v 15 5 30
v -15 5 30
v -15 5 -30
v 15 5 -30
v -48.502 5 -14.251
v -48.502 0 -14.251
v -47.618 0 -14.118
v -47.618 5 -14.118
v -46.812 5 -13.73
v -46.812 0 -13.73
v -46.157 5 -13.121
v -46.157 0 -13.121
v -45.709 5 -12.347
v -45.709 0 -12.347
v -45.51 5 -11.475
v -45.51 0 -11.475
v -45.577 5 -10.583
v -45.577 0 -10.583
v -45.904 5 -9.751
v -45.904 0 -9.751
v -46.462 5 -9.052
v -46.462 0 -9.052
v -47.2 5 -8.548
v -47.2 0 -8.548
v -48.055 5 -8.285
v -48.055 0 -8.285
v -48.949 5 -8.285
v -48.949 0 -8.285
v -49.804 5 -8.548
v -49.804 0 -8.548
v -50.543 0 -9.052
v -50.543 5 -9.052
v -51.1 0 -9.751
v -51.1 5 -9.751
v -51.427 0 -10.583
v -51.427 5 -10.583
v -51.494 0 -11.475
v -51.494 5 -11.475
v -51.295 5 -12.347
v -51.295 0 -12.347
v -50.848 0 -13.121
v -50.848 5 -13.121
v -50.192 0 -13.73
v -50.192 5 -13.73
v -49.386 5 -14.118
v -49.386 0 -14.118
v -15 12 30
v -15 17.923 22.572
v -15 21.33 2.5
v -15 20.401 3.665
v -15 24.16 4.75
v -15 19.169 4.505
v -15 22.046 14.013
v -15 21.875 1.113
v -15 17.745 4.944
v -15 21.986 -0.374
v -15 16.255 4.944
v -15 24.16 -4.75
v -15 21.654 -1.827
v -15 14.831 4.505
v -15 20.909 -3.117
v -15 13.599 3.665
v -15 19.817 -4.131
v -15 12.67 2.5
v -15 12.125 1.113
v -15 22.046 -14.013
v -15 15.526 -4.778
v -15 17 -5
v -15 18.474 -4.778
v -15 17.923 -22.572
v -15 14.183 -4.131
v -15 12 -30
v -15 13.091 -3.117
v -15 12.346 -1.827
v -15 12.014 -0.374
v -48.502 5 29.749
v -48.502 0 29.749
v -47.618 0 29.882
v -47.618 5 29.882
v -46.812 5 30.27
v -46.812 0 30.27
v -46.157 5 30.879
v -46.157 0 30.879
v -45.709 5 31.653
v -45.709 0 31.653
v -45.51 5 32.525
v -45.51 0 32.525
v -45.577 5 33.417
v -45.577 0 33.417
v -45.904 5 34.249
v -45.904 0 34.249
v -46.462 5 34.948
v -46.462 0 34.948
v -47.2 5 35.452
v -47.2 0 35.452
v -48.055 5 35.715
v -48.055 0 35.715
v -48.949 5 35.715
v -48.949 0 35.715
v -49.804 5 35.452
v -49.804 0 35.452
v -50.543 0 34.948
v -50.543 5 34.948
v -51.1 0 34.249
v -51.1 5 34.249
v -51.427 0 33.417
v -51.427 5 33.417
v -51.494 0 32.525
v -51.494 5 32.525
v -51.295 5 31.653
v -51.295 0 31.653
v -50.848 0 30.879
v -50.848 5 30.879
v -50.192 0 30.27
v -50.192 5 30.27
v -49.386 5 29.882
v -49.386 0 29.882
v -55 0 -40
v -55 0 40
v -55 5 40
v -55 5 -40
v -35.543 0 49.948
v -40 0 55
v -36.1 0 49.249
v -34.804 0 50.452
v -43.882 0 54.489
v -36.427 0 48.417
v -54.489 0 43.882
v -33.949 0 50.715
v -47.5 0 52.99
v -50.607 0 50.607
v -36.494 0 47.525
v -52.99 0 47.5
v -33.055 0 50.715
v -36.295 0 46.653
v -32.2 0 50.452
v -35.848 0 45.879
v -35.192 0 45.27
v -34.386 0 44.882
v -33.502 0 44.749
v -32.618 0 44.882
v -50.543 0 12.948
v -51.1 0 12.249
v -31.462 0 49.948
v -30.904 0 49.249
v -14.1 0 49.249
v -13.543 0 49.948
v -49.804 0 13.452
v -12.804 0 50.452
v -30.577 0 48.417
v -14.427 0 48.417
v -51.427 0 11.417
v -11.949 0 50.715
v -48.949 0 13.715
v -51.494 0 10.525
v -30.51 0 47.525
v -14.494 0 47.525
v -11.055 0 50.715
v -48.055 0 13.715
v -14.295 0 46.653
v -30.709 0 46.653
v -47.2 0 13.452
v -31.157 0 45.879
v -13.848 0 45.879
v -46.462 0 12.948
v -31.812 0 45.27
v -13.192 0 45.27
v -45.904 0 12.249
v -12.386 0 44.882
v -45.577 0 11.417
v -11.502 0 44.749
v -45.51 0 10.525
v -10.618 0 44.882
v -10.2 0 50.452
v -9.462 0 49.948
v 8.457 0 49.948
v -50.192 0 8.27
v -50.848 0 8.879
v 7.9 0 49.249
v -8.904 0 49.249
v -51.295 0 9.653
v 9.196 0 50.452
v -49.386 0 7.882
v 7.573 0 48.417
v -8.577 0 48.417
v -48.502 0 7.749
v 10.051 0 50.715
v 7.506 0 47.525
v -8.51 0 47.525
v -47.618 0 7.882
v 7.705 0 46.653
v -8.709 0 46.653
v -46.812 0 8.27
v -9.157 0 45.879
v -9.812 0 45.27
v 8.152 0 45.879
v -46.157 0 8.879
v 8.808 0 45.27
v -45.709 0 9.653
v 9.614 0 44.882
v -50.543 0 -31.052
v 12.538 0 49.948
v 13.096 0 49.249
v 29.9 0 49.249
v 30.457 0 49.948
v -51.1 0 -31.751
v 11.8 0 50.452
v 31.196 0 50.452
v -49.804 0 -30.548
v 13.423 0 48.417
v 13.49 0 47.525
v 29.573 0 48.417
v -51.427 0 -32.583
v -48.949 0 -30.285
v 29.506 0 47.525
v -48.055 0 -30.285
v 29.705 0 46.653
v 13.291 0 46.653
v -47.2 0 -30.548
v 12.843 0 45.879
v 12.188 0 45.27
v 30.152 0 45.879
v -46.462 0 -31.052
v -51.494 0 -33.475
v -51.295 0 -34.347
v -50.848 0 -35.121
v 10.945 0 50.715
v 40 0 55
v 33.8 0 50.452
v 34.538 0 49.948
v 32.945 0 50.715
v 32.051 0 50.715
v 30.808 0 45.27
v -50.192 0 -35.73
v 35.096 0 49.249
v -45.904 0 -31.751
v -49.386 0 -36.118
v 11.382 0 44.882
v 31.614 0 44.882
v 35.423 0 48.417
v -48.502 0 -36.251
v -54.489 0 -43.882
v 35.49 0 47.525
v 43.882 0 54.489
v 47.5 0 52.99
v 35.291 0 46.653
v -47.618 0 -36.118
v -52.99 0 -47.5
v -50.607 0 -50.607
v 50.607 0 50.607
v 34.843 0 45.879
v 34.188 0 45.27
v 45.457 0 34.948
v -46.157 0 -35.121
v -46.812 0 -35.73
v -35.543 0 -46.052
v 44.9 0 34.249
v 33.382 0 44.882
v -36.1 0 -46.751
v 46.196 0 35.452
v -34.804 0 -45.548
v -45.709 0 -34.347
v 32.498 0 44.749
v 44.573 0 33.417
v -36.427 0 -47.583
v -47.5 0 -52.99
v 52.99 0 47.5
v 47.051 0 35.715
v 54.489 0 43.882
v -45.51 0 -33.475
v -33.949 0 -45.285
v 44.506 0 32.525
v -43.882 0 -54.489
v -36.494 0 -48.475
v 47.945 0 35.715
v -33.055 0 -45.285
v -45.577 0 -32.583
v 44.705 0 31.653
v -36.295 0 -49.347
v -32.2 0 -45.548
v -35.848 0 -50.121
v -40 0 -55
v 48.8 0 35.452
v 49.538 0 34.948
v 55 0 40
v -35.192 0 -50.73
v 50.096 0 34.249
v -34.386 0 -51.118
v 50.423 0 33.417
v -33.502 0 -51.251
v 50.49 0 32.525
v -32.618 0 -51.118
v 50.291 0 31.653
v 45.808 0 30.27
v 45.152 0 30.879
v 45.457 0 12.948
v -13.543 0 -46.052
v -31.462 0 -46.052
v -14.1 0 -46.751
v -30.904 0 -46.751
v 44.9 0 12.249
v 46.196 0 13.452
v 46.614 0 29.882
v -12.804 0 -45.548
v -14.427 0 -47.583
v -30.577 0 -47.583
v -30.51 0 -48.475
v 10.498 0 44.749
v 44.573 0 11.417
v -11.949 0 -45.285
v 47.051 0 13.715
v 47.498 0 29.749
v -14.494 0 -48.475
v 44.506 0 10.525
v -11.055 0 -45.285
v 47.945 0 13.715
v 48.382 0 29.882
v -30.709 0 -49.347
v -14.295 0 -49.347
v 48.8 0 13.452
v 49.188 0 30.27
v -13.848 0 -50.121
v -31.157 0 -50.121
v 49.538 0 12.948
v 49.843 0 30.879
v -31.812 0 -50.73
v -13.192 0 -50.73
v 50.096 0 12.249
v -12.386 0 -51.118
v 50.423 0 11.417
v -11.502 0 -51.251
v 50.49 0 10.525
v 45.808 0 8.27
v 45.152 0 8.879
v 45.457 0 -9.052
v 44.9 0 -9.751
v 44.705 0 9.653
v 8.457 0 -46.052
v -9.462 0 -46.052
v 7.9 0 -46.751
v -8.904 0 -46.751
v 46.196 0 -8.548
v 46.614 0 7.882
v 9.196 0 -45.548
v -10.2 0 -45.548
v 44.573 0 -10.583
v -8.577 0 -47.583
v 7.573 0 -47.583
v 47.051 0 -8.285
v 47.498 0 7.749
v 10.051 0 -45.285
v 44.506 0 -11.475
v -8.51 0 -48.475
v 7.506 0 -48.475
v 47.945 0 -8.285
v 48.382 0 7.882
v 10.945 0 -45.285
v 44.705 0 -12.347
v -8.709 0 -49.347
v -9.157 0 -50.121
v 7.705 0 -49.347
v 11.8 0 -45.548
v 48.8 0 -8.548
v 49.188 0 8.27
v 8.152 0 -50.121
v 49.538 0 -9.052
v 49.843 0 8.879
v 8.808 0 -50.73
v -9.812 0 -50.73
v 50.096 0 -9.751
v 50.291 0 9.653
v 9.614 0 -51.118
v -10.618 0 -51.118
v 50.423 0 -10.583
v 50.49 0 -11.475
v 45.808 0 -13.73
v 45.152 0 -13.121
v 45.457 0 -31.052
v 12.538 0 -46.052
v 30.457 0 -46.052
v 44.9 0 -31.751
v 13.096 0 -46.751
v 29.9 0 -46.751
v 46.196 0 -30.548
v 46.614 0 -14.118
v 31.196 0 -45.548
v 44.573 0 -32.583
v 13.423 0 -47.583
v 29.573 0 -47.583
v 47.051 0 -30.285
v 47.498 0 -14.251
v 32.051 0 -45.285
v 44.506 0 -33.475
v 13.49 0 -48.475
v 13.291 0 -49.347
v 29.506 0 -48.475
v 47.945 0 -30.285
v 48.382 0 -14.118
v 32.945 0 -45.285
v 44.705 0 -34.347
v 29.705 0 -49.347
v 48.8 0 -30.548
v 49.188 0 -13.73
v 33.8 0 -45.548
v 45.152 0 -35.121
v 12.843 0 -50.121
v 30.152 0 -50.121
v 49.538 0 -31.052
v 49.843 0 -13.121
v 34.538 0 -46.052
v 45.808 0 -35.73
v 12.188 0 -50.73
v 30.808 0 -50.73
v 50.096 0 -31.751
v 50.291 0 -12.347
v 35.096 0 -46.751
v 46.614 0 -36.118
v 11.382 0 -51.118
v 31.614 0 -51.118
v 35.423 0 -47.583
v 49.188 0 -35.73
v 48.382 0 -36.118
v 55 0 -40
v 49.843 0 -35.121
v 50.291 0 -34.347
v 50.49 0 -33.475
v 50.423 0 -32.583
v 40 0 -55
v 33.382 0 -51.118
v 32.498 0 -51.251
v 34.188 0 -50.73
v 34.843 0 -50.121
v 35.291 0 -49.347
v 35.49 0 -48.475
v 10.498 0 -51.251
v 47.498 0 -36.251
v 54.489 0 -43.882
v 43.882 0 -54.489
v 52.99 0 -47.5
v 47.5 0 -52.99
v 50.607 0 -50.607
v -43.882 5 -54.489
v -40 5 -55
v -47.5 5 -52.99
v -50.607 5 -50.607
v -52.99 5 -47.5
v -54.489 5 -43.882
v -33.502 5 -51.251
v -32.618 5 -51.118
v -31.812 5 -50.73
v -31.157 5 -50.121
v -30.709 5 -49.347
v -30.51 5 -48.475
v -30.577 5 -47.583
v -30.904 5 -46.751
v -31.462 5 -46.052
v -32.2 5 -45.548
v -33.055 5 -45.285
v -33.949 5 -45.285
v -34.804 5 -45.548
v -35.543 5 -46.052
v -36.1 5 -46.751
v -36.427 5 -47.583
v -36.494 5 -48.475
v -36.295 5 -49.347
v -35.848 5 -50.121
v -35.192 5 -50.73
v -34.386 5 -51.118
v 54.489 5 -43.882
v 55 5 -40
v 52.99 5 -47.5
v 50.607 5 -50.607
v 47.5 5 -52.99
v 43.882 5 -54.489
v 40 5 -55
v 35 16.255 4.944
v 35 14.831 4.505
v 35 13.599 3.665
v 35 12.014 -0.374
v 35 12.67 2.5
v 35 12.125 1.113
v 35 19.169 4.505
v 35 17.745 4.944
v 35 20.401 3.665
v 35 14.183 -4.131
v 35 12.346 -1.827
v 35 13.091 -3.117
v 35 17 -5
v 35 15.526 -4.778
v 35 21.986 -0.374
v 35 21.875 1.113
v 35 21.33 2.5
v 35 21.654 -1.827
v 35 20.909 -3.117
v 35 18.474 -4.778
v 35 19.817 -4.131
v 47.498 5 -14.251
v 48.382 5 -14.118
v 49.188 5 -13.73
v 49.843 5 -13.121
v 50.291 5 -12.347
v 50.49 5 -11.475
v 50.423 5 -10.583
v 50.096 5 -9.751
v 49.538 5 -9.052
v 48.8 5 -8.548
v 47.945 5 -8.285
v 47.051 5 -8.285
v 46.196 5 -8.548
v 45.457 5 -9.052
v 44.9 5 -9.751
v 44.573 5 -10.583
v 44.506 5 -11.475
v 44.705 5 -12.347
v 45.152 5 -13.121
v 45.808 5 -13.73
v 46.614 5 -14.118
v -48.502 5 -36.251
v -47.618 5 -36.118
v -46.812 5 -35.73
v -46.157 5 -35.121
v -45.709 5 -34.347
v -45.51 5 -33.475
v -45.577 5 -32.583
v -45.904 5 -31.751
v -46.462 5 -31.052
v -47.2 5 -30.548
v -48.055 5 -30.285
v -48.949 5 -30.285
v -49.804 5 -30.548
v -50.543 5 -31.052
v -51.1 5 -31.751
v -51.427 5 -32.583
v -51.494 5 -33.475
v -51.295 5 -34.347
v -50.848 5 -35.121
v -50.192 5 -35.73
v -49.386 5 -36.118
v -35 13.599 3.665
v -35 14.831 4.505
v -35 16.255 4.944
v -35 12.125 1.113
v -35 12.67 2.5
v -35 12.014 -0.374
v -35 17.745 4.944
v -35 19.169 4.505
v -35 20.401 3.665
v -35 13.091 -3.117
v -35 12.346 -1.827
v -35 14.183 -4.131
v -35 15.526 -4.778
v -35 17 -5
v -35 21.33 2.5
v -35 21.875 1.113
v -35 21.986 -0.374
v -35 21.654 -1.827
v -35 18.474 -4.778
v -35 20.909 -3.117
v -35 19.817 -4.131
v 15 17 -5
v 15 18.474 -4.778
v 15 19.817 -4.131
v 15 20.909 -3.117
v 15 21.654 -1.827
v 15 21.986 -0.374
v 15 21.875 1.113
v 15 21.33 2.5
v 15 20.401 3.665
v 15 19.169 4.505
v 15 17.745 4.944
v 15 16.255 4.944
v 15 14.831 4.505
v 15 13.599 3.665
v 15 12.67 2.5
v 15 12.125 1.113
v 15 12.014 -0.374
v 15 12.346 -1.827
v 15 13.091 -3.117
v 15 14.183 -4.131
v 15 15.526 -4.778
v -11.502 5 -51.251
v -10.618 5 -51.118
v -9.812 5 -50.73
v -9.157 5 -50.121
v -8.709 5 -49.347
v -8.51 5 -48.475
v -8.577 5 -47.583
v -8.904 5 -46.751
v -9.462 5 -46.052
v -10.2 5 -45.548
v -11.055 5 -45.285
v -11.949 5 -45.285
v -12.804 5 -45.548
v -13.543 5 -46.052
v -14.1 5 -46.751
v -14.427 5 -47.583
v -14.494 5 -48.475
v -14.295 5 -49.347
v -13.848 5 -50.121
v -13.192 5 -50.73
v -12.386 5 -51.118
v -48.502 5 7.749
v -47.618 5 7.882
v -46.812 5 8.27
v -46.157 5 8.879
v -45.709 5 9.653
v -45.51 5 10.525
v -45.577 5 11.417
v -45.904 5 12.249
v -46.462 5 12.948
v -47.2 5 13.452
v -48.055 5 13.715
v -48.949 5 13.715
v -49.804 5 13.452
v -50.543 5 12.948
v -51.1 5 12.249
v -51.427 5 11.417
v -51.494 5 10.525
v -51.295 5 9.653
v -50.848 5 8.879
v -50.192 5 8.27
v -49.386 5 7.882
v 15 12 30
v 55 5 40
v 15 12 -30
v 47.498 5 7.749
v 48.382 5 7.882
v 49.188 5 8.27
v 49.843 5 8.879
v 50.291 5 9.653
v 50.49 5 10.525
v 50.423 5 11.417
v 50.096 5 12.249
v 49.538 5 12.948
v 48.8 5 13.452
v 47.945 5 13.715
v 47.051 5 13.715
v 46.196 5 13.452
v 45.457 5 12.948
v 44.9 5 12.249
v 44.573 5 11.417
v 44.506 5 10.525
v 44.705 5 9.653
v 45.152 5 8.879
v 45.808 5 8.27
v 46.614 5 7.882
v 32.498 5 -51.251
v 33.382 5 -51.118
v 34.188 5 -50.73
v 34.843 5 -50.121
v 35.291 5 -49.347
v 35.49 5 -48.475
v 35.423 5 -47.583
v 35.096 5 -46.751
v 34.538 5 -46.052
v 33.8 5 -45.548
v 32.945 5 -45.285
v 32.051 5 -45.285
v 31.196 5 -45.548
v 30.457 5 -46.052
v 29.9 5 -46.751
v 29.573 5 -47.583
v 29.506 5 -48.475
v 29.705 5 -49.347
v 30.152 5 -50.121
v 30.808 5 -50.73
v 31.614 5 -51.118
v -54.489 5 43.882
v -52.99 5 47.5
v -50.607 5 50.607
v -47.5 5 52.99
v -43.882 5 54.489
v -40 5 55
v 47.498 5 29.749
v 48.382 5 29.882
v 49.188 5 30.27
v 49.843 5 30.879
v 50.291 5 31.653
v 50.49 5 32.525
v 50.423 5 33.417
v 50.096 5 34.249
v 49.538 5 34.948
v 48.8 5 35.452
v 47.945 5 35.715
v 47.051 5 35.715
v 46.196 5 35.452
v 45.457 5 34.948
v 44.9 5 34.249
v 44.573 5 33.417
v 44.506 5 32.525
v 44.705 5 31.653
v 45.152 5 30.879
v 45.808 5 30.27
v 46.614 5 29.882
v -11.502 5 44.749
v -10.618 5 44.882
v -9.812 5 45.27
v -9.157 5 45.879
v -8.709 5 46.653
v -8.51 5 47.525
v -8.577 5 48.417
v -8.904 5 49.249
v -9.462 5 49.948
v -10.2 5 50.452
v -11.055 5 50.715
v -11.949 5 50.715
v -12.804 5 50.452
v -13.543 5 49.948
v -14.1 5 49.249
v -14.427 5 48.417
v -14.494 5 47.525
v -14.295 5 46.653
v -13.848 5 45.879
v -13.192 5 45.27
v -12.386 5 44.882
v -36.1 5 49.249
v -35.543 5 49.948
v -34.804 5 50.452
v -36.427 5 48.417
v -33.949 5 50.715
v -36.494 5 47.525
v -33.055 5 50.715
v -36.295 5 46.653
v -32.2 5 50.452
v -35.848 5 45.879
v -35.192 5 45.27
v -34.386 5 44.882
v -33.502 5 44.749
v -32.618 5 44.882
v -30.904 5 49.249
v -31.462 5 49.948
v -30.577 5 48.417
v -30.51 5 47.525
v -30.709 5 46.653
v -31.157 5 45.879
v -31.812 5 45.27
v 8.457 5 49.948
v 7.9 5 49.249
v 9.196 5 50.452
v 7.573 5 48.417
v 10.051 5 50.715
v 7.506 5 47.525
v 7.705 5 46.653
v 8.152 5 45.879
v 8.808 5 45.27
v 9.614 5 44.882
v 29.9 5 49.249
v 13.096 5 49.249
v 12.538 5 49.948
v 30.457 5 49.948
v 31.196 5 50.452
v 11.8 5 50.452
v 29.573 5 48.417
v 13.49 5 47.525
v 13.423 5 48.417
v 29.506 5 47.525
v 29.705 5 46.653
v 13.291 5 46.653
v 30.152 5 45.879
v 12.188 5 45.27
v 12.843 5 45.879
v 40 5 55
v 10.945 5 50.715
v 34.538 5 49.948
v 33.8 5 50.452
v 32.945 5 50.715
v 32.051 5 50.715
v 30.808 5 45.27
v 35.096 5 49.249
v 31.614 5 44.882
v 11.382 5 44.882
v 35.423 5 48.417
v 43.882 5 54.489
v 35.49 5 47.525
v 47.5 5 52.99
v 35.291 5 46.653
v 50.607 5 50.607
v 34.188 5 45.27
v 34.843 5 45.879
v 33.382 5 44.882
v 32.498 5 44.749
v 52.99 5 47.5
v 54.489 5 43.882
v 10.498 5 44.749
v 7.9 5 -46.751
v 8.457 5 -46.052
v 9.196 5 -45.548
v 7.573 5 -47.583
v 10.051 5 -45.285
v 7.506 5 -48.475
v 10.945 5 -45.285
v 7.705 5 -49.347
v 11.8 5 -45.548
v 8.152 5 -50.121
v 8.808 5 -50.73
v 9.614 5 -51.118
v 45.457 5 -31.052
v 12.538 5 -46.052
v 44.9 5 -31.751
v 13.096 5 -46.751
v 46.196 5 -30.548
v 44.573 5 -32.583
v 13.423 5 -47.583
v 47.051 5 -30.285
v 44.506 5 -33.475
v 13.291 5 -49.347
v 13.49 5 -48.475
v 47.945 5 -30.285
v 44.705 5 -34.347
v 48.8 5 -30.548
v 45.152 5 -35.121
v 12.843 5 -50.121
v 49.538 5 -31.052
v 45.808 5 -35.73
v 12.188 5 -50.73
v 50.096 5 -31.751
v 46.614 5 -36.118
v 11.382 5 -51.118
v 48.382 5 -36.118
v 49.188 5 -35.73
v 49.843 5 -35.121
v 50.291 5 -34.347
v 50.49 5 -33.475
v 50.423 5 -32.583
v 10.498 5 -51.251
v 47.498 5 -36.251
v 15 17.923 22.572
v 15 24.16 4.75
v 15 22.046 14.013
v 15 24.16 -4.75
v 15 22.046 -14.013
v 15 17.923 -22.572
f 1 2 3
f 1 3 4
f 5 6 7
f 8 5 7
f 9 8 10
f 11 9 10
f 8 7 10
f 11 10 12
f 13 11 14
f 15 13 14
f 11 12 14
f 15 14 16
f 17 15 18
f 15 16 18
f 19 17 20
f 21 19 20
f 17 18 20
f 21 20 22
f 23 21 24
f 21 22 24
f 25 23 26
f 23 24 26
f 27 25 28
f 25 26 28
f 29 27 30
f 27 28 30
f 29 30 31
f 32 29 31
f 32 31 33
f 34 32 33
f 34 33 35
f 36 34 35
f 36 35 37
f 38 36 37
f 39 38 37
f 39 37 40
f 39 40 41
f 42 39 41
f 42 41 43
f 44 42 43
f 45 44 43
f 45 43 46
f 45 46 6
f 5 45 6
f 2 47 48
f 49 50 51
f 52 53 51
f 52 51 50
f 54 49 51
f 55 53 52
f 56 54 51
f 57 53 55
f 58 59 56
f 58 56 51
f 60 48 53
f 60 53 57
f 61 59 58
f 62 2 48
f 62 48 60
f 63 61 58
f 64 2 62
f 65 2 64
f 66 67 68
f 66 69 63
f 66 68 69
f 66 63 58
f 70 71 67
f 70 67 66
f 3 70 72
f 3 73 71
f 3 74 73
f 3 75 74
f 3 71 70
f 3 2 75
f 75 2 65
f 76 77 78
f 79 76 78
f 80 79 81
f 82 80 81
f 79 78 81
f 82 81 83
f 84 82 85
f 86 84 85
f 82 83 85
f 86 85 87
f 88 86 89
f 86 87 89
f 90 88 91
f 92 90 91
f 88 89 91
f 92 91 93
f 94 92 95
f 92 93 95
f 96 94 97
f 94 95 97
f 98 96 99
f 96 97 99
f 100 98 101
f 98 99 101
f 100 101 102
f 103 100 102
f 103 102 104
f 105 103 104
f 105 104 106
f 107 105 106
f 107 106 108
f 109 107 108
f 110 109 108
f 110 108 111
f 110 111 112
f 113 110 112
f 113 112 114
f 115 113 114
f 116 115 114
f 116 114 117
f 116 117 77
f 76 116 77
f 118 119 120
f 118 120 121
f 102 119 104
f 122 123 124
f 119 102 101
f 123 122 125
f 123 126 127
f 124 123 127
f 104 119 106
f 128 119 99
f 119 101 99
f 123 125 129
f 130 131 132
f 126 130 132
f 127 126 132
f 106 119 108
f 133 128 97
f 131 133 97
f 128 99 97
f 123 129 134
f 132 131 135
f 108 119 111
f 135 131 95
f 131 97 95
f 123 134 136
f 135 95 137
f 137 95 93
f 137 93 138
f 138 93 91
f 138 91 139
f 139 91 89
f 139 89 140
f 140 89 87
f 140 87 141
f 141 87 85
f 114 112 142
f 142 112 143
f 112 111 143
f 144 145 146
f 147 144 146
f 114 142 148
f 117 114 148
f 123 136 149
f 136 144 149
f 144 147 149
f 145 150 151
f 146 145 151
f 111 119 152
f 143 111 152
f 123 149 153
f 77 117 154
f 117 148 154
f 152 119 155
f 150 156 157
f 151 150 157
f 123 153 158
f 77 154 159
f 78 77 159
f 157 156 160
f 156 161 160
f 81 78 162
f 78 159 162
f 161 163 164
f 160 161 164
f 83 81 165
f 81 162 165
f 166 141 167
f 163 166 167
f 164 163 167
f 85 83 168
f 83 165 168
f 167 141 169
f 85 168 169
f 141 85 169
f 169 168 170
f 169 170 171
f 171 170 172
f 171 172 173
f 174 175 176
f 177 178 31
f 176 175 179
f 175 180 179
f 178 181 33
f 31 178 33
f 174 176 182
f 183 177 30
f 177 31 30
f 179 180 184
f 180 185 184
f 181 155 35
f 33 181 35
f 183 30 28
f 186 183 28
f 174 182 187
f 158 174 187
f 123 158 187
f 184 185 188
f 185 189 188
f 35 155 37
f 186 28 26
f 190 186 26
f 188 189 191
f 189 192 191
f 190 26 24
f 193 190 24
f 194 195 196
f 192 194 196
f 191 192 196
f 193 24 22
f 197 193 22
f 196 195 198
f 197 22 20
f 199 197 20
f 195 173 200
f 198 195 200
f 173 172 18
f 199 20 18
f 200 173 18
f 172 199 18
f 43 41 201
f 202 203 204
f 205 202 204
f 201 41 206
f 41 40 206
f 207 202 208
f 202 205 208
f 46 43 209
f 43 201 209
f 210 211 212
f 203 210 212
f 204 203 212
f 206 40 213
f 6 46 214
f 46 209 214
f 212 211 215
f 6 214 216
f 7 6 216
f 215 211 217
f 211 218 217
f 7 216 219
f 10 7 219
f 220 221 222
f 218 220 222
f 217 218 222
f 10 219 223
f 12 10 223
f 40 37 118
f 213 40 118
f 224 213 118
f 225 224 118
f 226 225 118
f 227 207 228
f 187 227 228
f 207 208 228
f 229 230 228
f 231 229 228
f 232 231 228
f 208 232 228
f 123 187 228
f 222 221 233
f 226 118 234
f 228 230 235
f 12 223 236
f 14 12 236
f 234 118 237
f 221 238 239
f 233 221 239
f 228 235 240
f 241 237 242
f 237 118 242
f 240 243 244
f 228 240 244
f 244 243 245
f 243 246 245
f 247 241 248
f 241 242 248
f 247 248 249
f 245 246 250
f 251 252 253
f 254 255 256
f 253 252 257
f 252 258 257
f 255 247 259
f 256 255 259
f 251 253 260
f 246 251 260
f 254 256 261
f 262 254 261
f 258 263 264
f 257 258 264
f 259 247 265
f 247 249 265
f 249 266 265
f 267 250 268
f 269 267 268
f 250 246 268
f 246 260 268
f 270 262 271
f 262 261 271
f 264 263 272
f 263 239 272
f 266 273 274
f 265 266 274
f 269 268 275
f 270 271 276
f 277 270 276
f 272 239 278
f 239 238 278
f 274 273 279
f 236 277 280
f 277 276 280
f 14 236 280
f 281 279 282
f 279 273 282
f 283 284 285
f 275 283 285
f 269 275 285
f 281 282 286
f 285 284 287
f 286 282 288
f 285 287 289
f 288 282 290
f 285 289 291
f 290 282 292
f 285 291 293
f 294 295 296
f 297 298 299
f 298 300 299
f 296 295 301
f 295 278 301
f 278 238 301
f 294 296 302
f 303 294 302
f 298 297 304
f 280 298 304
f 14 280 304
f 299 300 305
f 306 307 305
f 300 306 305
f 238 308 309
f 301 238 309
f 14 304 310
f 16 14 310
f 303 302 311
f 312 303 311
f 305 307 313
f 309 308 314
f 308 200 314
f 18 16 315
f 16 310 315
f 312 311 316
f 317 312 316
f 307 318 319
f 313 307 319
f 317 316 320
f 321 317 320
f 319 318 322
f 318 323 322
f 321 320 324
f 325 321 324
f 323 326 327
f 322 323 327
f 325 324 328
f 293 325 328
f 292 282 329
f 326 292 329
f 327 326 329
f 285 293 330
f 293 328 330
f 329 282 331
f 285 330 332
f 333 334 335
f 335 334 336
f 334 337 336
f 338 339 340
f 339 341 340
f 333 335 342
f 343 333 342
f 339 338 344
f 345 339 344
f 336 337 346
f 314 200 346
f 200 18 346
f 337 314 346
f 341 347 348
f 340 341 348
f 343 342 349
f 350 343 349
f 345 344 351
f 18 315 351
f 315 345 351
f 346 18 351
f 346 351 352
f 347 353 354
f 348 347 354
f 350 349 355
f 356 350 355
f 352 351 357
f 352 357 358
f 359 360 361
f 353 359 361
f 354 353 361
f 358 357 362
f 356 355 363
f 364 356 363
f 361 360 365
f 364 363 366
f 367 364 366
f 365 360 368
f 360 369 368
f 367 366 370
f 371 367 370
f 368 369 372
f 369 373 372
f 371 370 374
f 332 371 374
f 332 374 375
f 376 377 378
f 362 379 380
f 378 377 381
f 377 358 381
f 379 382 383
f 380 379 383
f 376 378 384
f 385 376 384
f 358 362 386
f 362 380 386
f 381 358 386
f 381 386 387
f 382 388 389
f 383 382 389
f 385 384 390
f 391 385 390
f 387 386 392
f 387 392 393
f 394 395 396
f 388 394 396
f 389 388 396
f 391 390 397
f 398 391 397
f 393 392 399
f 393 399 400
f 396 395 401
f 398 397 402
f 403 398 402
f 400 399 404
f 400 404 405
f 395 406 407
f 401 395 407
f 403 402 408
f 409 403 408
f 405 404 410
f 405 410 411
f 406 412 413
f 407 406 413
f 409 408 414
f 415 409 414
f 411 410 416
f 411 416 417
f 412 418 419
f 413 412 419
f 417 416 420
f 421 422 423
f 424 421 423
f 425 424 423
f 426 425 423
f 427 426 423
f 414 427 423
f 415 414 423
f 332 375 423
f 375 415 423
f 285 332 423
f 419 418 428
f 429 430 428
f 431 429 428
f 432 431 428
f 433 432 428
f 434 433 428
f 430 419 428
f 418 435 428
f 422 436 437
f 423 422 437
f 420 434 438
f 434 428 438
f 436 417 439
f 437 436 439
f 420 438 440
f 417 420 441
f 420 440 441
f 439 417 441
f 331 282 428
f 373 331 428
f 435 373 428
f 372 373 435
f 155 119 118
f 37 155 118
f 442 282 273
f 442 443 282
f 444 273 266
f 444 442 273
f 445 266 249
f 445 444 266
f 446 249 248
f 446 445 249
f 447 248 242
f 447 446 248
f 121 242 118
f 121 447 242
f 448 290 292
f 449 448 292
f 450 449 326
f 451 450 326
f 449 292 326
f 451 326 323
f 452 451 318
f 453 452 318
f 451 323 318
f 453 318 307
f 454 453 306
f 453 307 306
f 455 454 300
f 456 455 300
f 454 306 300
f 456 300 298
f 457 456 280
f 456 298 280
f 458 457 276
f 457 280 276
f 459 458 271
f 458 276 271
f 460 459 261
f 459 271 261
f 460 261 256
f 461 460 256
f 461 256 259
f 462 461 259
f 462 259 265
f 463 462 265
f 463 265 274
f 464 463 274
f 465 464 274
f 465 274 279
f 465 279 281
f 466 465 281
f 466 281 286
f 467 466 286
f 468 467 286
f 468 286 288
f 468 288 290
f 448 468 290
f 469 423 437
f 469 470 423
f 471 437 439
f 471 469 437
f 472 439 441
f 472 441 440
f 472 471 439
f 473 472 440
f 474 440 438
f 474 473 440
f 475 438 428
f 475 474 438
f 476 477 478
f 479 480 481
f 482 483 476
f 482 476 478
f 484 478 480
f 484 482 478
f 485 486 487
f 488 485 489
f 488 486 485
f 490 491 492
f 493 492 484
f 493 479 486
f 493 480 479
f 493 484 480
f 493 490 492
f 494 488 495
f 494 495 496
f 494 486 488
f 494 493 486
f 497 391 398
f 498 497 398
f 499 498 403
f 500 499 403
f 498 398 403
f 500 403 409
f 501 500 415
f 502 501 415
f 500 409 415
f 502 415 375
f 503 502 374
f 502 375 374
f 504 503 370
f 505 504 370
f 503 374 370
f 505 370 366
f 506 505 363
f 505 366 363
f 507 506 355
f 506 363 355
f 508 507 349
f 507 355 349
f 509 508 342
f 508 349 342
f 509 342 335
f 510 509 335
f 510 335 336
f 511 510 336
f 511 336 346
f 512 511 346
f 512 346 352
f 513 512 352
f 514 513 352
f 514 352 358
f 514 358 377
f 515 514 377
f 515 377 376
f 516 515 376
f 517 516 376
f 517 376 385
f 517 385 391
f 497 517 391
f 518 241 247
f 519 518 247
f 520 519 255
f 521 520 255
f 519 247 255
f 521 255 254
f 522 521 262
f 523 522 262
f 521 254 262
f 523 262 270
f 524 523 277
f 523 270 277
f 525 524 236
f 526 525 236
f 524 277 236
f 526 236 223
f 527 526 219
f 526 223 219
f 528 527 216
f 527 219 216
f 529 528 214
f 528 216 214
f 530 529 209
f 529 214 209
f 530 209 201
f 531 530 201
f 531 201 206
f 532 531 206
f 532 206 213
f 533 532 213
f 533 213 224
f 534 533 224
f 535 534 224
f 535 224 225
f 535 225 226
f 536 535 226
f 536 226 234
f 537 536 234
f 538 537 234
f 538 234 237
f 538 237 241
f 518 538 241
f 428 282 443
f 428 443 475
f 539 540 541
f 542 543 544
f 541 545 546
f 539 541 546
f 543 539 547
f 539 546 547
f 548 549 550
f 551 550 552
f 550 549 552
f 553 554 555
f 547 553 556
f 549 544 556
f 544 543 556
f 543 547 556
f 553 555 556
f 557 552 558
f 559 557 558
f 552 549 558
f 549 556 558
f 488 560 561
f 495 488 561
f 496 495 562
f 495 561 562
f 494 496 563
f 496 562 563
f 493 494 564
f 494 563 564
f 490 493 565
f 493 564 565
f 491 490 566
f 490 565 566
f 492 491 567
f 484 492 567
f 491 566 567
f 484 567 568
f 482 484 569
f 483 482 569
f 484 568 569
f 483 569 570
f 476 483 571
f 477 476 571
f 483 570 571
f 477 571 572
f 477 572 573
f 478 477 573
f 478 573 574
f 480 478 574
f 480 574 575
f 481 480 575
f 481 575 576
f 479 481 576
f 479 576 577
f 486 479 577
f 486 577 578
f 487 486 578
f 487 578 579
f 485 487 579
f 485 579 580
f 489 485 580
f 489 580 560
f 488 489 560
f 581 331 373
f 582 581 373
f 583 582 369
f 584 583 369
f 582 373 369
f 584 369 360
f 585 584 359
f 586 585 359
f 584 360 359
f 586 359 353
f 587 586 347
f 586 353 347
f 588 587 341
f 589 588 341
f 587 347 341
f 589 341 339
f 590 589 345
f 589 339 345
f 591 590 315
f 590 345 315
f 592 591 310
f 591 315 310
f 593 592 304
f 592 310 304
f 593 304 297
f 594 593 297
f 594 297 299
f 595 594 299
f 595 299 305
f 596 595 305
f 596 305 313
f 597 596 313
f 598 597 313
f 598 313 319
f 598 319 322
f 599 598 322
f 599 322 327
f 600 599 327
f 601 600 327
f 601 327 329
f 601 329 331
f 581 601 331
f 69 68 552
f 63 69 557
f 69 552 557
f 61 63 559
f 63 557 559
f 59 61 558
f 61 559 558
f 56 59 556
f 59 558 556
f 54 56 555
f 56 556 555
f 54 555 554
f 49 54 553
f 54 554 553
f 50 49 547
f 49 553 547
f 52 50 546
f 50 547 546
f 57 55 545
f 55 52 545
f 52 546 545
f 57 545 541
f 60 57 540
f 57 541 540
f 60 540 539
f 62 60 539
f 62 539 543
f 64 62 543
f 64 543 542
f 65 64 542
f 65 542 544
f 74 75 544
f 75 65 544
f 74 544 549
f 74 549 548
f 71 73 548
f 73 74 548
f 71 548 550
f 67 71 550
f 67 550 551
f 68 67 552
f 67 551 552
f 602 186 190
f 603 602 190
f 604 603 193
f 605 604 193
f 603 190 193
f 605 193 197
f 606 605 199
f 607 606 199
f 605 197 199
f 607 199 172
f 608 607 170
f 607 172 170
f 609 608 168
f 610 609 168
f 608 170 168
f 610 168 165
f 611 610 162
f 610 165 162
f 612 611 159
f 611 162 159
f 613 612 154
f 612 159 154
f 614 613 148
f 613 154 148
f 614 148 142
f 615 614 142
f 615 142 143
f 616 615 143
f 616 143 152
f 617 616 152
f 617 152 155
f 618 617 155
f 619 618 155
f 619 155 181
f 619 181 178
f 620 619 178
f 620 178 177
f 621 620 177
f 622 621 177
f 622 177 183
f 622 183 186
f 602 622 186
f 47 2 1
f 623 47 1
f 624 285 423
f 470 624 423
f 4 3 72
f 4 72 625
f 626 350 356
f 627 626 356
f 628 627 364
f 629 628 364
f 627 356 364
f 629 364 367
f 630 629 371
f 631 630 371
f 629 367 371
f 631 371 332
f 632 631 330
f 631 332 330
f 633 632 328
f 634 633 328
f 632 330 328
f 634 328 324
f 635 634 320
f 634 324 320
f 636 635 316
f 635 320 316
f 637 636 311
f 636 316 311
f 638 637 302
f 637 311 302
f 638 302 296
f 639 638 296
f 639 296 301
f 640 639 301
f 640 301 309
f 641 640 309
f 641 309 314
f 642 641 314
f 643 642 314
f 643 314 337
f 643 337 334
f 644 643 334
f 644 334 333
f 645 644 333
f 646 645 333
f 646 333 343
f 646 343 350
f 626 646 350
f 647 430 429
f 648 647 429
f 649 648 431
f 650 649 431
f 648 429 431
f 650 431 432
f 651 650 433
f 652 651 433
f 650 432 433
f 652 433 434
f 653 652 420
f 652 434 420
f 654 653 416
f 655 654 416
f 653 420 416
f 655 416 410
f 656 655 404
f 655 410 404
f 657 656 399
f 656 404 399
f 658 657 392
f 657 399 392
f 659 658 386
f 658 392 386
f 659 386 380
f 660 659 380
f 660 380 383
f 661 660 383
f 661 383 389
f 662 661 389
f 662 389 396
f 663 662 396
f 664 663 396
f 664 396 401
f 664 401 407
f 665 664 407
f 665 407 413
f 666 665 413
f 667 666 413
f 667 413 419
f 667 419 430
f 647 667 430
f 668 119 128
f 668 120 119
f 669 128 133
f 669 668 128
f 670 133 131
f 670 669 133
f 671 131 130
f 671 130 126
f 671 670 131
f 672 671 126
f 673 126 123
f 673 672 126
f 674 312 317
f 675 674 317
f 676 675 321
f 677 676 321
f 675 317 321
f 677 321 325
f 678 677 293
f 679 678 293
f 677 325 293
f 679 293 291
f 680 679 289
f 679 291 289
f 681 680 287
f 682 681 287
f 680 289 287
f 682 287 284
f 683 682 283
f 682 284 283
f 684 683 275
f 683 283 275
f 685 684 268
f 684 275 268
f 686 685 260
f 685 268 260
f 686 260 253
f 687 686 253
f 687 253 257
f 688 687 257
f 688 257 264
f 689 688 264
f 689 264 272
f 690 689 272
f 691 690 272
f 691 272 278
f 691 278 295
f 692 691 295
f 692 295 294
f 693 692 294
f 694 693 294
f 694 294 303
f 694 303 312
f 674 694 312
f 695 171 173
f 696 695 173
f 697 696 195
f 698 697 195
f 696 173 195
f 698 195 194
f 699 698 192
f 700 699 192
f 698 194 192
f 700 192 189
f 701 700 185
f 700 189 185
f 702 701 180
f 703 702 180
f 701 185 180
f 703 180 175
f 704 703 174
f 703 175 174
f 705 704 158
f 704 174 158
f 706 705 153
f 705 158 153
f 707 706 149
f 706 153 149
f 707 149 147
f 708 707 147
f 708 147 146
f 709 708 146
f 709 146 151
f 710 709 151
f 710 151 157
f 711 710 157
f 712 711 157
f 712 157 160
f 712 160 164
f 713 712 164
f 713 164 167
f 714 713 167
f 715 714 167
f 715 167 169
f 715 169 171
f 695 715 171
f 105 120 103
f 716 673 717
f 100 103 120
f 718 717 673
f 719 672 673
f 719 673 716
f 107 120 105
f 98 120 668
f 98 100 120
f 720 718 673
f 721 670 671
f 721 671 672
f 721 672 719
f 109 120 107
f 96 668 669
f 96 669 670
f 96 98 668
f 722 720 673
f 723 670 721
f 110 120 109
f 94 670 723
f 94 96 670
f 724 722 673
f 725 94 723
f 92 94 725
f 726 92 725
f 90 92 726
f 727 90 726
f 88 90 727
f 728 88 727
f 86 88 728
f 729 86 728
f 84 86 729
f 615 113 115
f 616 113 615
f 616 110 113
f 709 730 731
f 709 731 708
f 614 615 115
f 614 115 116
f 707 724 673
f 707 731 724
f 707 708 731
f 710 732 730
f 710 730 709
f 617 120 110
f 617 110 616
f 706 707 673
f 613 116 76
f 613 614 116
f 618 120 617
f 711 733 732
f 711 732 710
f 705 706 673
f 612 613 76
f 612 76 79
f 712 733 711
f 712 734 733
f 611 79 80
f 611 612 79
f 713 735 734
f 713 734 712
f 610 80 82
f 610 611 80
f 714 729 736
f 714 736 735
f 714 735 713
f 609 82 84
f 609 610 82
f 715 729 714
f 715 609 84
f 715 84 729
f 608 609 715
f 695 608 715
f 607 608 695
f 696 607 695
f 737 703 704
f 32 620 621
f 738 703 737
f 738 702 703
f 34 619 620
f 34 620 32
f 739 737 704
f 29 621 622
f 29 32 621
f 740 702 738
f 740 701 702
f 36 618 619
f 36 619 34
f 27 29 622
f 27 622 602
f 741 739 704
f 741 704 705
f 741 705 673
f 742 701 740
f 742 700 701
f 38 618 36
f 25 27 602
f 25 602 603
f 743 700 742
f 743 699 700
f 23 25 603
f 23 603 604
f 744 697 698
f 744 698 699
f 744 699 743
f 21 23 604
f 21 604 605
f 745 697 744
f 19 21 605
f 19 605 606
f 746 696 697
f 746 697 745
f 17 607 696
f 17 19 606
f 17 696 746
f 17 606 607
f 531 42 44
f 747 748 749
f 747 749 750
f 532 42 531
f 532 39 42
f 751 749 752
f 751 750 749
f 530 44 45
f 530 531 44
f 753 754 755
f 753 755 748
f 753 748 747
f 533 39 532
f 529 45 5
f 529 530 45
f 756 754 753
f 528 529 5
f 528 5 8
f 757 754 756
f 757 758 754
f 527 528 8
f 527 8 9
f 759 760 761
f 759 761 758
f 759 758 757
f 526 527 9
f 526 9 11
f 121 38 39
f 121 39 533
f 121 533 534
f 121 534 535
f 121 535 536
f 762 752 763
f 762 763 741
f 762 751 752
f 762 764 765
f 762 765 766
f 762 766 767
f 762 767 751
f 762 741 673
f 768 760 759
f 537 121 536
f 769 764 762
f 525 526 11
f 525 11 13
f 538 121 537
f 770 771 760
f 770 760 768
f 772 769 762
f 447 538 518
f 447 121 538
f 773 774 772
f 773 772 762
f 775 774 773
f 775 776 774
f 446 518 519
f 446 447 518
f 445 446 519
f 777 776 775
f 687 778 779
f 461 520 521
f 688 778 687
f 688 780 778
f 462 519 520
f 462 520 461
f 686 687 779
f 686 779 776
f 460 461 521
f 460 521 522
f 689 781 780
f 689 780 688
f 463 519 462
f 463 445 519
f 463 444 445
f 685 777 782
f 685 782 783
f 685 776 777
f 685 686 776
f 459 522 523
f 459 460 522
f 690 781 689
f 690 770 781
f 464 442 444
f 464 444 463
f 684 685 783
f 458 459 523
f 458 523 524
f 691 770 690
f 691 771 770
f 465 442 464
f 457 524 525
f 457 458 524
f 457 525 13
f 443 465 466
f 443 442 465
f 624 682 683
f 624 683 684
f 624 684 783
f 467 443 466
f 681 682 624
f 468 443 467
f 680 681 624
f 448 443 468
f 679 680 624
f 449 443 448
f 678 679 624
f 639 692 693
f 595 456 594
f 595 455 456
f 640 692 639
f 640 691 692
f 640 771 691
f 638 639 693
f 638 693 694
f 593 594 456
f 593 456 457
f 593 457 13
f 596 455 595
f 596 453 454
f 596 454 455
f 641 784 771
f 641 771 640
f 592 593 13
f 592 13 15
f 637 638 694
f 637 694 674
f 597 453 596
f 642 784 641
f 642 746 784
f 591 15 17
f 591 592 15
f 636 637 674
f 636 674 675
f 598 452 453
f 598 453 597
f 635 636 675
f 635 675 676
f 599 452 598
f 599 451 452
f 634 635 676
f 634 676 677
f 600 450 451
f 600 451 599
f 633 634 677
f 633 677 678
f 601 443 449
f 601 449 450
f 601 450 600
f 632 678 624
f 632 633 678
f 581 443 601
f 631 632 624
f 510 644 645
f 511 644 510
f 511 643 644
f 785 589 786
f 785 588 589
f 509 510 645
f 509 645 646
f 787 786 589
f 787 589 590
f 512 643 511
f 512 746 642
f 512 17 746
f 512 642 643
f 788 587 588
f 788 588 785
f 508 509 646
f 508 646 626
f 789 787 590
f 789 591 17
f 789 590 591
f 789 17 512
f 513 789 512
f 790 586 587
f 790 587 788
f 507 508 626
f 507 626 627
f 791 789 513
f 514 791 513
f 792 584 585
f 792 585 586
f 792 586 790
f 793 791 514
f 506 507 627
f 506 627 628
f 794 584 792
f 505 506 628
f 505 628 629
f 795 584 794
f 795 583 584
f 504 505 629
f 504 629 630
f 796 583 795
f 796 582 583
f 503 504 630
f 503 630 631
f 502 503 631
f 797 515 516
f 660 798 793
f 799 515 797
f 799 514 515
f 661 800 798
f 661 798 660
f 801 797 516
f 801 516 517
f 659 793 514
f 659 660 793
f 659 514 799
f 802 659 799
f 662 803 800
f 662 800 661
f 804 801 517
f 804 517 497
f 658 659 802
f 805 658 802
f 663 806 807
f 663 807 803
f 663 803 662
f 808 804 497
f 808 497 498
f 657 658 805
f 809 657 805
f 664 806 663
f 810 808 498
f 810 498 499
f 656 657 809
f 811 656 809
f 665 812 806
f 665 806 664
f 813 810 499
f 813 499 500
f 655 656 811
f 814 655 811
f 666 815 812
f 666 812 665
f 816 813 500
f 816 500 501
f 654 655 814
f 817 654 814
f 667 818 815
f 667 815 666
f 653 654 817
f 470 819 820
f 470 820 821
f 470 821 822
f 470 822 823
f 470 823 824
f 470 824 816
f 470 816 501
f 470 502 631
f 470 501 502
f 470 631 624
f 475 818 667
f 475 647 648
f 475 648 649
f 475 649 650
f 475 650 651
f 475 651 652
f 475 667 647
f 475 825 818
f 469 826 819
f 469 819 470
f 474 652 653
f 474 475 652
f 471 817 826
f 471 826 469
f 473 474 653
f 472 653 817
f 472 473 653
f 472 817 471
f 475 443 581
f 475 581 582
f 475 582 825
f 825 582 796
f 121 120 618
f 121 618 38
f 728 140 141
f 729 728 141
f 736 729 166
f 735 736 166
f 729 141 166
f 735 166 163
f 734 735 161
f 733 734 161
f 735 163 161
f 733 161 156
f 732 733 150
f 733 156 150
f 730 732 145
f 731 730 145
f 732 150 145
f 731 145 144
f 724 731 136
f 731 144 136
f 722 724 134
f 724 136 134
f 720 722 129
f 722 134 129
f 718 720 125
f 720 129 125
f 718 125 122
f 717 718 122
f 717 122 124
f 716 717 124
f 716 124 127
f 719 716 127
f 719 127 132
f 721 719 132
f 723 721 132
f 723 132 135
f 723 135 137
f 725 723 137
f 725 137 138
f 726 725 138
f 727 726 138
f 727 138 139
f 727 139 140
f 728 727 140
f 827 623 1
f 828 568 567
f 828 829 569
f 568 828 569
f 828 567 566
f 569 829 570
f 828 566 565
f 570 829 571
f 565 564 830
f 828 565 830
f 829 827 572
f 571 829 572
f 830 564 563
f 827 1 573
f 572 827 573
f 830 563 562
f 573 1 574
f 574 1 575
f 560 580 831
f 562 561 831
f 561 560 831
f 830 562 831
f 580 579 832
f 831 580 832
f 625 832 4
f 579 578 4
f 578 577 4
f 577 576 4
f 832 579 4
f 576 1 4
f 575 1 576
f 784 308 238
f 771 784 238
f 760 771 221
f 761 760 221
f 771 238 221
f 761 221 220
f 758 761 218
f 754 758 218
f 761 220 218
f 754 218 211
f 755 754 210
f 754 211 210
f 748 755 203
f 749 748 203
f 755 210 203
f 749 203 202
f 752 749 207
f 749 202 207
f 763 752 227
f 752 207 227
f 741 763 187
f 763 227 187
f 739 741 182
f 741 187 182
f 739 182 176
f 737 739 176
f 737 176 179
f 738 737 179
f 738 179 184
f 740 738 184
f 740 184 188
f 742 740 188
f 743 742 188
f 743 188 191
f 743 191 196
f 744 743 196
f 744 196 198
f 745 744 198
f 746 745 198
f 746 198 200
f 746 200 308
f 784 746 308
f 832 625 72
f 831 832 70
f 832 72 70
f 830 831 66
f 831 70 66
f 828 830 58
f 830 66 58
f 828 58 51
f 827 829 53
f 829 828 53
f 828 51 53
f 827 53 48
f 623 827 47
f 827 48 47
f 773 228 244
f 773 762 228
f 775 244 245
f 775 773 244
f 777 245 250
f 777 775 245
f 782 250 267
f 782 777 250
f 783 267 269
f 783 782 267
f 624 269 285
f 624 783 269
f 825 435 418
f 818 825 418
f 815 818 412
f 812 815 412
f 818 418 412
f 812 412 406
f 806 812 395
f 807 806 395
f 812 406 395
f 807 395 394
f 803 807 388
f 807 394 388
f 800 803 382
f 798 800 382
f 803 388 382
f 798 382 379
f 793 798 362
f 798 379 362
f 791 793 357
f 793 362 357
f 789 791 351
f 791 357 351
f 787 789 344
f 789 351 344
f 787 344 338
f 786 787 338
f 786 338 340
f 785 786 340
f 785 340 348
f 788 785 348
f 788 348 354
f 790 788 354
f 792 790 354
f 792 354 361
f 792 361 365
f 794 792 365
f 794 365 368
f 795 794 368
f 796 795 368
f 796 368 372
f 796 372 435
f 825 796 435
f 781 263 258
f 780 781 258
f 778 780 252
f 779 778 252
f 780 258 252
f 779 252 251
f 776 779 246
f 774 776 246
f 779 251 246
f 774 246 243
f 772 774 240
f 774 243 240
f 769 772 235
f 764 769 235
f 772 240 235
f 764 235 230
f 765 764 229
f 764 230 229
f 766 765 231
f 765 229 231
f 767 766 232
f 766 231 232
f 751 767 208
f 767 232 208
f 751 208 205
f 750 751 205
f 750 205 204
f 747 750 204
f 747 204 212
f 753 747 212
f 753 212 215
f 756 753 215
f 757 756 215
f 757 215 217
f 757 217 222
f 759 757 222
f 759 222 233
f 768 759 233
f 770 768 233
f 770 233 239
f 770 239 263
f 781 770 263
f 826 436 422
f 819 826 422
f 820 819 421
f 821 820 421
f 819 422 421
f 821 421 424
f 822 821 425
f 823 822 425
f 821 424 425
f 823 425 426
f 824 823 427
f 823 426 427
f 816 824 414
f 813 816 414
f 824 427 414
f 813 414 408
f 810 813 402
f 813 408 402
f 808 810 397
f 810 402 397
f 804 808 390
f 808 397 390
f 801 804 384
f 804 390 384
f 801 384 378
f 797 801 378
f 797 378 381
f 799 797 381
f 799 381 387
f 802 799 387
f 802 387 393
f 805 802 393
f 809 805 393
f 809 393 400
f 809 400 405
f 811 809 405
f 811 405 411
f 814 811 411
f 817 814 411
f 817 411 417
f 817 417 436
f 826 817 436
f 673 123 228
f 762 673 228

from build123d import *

# Parameters (mm, degrees)
SKETCH1_W                = 110
SKETCH1_H                = 110
BOSS_EXTRUDE1_DEPTH      = 5
FILLET2_R                = 15
FILLET3_R                = 15
FILLET4_R                = 15
FILLET5_R                = 15
SKETCH2_W                = 30
SKETCH2_H                = 60
BOSS_EXTRUDE2_DEPTH      = 24
BOSS_EXTRUDE3_DEPTH      = 20
BOSS_EXTRUDE3_DEPTH_BACK = 50
SKETCH4_R                = 5
FILLET6_R                = 10
FILLET7_R                = 10
SKETCH5_R                = 3
CUT_EXTRUDE2_DEPTH       = 10
CUT_EXTRUDE3_DEPTH       = 60


with BuildPart() as part:
    # Sketch1 → Boss-Extrude1 (new body)
    with BuildSketch(Plane(origin=(0, 0, 0), x_dir=(1, 0, 0), z_dir=(0, 1, 0))):
        Rectangle(SKETCH1_W, SKETCH1_H)
    extrude(amount=BOSS_EXTRUDE1_DEPTH)

    # Fillet2
    fillet2_edges = [part.edges().sort_by_distance(p)[0] for p in [
        (55, 2.5, -55),
    ]]
    fillet(fillet2_edges, radius=FILLET2_R)

    # Fillet3
    fillet3_edges = [part.edges().sort_by_distance(p)[0] for p in [
        (-55, 2.5, -55),
    ]]
    fillet(fillet3_edges, radius=FILLET3_R)

    # Fillet4
    fillet4_edges = [part.edges().sort_by_distance(p)[0] for p in [
        (-55, 2.5, 55),
    ]]
    fillet(fillet4_edges, radius=FILLET4_R)

    # Fillet5
    fillet5_edges = [part.edges().sort_by_distance(p)[0] for p in [
        (55, 2.5, 55),
    ]]
    fillet(fillet5_edges, radius=FILLET5_R)

    # Sketch2 → Boss-Extrude2 (add)
    with BuildSketch(Plane(origin=(0, 5, 0), x_dir=(1, 0, 0), z_dir=(0, 1, 0))):
        Rectangle(SKETCH2_W, SKETCH2_H)
    extrude(amount=BOSS_EXTRUDE2_DEPTH)

    # Sketch4 → Boss-Extrude3 (add, two sides: drawn at the far end of the back side and taken through both)
    with BuildSketch(Plane(origin=(15, 0, 0), x_dir=(0, 0, -1), z_dir=(1, 0, 0)).offset(-BOSS_EXTRUDE3_DEPTH_BACK)):
        with Locations((0, 17)):
            Circle(SKETCH4_R)
    extrude(amount=BOSS_EXTRUDE3_DEPTH + BOSS_EXTRUDE3_DEPTH_BACK)

    # Fillet6
    fillet6_edges = [part.edges().sort_by_distance(p)[0] for p in [
        (0, 29, 30),
    ]]
    fillet(fillet6_edges, radius=FILLET6_R)

    # Fillet7
    fillet7_edges = [part.edges().sort_by_distance(p)[0] for p in [
        (0, 29, -30),
    ]]
    fillet(fillet7_edges, radius=FILLET7_R)

    # Sketch5 → Cut-Extrude2 (cut)
    with BuildSketch(Plane.XZ):
        with Locations((47.497955542, -11.251022229)):
            Circle(SKETCH5_R)
        with Locations((47.497955542, 32.748977771)):
            Circle(SKETCH5_R)
        with Locations((-48.502044458, 10.748977771)):
            Circle(SKETCH5_R)
        with Locations((-48.502044458, -11.251022229)):
            Circle(SKETCH5_R)
        with Locations((-48.502044458, -33.251022229)):
            Circle(SKETCH5_R)
        with Locations((-33.502044458, -48.251022229)):
            Circle(SKETCH5_R)
        with Locations((-11.502044458, -48.251022229)):
            Circle(SKETCH5_R)
        with Locations((10.497955542, -48.251022229)):
            Circle(SKETCH5_R)
        with Locations((32.497955542, -48.251022229)):
            Circle(SKETCH5_R)
        with Locations((47.497955542, -33.251022229)):
            Circle(SKETCH5_R)
        with Locations((47.497955542, 10.748977771)):
            Circle(SKETCH5_R)
        with Locations((32.497955542, 47.748977771)):
            Circle(SKETCH5_R)
        with Locations((10.497955542, 47.748977771)):
            Circle(SKETCH5_R)
        with Locations((-11.502044458, 47.748977771)):
            Circle(SKETCH5_R)
        with Locations((-33.502044458, 47.748977771)):
            Circle(SKETCH5_R)
        with Locations((-48.502044458, 32.748977771)):
            Circle(SKETCH5_R)
    extrude(amount=-CUT_EXTRUDE2_DEPTH, mode=Mode.SUBTRACT)

    # Sketch8 → Cut-Extrude3 (cut)
    with BuildSketch(Plane.ZY.offset(15)):
        with BuildLine():
            Line((-30, 19), (-30, 12))
            ThreePointArc((-30, 12), (0, 24.426406871), (30, 12))
            Line((30, 12), (30, 19))
            ThreePointArc((30, 19), (27.071067812, 26.071067812), (20, 29))
            Line((20, 29), (-20, 29))
            ThreePointArc((-20, 29), (-27.071067812, 26.071067812), (-30, 19))
        make_face()
    extrude(amount=-CUT_EXTRUDE3_DEPTH, mode=Mode.SUBTRACT)


with BuildPart() as body_2:
    # Split1: the piece on the far side of the plane
    add(part.part)
    split(bisect_by=Plane(origin=(0, 5, 0), x_dir=(0, 0, -1), z_dir=(0, -1, 0)), keep=Keep.BOTTOM)


with BuildPart() as part_1:
    add(part.part)

    # Split1
    split(bisect_by=Plane(origin=(0, 5, 0), x_dir=(0, 0, -1), z_dir=(0, -1, 0)), keep=Keep.TOP)


solid = Compound([body_2.part, part_1.part])
